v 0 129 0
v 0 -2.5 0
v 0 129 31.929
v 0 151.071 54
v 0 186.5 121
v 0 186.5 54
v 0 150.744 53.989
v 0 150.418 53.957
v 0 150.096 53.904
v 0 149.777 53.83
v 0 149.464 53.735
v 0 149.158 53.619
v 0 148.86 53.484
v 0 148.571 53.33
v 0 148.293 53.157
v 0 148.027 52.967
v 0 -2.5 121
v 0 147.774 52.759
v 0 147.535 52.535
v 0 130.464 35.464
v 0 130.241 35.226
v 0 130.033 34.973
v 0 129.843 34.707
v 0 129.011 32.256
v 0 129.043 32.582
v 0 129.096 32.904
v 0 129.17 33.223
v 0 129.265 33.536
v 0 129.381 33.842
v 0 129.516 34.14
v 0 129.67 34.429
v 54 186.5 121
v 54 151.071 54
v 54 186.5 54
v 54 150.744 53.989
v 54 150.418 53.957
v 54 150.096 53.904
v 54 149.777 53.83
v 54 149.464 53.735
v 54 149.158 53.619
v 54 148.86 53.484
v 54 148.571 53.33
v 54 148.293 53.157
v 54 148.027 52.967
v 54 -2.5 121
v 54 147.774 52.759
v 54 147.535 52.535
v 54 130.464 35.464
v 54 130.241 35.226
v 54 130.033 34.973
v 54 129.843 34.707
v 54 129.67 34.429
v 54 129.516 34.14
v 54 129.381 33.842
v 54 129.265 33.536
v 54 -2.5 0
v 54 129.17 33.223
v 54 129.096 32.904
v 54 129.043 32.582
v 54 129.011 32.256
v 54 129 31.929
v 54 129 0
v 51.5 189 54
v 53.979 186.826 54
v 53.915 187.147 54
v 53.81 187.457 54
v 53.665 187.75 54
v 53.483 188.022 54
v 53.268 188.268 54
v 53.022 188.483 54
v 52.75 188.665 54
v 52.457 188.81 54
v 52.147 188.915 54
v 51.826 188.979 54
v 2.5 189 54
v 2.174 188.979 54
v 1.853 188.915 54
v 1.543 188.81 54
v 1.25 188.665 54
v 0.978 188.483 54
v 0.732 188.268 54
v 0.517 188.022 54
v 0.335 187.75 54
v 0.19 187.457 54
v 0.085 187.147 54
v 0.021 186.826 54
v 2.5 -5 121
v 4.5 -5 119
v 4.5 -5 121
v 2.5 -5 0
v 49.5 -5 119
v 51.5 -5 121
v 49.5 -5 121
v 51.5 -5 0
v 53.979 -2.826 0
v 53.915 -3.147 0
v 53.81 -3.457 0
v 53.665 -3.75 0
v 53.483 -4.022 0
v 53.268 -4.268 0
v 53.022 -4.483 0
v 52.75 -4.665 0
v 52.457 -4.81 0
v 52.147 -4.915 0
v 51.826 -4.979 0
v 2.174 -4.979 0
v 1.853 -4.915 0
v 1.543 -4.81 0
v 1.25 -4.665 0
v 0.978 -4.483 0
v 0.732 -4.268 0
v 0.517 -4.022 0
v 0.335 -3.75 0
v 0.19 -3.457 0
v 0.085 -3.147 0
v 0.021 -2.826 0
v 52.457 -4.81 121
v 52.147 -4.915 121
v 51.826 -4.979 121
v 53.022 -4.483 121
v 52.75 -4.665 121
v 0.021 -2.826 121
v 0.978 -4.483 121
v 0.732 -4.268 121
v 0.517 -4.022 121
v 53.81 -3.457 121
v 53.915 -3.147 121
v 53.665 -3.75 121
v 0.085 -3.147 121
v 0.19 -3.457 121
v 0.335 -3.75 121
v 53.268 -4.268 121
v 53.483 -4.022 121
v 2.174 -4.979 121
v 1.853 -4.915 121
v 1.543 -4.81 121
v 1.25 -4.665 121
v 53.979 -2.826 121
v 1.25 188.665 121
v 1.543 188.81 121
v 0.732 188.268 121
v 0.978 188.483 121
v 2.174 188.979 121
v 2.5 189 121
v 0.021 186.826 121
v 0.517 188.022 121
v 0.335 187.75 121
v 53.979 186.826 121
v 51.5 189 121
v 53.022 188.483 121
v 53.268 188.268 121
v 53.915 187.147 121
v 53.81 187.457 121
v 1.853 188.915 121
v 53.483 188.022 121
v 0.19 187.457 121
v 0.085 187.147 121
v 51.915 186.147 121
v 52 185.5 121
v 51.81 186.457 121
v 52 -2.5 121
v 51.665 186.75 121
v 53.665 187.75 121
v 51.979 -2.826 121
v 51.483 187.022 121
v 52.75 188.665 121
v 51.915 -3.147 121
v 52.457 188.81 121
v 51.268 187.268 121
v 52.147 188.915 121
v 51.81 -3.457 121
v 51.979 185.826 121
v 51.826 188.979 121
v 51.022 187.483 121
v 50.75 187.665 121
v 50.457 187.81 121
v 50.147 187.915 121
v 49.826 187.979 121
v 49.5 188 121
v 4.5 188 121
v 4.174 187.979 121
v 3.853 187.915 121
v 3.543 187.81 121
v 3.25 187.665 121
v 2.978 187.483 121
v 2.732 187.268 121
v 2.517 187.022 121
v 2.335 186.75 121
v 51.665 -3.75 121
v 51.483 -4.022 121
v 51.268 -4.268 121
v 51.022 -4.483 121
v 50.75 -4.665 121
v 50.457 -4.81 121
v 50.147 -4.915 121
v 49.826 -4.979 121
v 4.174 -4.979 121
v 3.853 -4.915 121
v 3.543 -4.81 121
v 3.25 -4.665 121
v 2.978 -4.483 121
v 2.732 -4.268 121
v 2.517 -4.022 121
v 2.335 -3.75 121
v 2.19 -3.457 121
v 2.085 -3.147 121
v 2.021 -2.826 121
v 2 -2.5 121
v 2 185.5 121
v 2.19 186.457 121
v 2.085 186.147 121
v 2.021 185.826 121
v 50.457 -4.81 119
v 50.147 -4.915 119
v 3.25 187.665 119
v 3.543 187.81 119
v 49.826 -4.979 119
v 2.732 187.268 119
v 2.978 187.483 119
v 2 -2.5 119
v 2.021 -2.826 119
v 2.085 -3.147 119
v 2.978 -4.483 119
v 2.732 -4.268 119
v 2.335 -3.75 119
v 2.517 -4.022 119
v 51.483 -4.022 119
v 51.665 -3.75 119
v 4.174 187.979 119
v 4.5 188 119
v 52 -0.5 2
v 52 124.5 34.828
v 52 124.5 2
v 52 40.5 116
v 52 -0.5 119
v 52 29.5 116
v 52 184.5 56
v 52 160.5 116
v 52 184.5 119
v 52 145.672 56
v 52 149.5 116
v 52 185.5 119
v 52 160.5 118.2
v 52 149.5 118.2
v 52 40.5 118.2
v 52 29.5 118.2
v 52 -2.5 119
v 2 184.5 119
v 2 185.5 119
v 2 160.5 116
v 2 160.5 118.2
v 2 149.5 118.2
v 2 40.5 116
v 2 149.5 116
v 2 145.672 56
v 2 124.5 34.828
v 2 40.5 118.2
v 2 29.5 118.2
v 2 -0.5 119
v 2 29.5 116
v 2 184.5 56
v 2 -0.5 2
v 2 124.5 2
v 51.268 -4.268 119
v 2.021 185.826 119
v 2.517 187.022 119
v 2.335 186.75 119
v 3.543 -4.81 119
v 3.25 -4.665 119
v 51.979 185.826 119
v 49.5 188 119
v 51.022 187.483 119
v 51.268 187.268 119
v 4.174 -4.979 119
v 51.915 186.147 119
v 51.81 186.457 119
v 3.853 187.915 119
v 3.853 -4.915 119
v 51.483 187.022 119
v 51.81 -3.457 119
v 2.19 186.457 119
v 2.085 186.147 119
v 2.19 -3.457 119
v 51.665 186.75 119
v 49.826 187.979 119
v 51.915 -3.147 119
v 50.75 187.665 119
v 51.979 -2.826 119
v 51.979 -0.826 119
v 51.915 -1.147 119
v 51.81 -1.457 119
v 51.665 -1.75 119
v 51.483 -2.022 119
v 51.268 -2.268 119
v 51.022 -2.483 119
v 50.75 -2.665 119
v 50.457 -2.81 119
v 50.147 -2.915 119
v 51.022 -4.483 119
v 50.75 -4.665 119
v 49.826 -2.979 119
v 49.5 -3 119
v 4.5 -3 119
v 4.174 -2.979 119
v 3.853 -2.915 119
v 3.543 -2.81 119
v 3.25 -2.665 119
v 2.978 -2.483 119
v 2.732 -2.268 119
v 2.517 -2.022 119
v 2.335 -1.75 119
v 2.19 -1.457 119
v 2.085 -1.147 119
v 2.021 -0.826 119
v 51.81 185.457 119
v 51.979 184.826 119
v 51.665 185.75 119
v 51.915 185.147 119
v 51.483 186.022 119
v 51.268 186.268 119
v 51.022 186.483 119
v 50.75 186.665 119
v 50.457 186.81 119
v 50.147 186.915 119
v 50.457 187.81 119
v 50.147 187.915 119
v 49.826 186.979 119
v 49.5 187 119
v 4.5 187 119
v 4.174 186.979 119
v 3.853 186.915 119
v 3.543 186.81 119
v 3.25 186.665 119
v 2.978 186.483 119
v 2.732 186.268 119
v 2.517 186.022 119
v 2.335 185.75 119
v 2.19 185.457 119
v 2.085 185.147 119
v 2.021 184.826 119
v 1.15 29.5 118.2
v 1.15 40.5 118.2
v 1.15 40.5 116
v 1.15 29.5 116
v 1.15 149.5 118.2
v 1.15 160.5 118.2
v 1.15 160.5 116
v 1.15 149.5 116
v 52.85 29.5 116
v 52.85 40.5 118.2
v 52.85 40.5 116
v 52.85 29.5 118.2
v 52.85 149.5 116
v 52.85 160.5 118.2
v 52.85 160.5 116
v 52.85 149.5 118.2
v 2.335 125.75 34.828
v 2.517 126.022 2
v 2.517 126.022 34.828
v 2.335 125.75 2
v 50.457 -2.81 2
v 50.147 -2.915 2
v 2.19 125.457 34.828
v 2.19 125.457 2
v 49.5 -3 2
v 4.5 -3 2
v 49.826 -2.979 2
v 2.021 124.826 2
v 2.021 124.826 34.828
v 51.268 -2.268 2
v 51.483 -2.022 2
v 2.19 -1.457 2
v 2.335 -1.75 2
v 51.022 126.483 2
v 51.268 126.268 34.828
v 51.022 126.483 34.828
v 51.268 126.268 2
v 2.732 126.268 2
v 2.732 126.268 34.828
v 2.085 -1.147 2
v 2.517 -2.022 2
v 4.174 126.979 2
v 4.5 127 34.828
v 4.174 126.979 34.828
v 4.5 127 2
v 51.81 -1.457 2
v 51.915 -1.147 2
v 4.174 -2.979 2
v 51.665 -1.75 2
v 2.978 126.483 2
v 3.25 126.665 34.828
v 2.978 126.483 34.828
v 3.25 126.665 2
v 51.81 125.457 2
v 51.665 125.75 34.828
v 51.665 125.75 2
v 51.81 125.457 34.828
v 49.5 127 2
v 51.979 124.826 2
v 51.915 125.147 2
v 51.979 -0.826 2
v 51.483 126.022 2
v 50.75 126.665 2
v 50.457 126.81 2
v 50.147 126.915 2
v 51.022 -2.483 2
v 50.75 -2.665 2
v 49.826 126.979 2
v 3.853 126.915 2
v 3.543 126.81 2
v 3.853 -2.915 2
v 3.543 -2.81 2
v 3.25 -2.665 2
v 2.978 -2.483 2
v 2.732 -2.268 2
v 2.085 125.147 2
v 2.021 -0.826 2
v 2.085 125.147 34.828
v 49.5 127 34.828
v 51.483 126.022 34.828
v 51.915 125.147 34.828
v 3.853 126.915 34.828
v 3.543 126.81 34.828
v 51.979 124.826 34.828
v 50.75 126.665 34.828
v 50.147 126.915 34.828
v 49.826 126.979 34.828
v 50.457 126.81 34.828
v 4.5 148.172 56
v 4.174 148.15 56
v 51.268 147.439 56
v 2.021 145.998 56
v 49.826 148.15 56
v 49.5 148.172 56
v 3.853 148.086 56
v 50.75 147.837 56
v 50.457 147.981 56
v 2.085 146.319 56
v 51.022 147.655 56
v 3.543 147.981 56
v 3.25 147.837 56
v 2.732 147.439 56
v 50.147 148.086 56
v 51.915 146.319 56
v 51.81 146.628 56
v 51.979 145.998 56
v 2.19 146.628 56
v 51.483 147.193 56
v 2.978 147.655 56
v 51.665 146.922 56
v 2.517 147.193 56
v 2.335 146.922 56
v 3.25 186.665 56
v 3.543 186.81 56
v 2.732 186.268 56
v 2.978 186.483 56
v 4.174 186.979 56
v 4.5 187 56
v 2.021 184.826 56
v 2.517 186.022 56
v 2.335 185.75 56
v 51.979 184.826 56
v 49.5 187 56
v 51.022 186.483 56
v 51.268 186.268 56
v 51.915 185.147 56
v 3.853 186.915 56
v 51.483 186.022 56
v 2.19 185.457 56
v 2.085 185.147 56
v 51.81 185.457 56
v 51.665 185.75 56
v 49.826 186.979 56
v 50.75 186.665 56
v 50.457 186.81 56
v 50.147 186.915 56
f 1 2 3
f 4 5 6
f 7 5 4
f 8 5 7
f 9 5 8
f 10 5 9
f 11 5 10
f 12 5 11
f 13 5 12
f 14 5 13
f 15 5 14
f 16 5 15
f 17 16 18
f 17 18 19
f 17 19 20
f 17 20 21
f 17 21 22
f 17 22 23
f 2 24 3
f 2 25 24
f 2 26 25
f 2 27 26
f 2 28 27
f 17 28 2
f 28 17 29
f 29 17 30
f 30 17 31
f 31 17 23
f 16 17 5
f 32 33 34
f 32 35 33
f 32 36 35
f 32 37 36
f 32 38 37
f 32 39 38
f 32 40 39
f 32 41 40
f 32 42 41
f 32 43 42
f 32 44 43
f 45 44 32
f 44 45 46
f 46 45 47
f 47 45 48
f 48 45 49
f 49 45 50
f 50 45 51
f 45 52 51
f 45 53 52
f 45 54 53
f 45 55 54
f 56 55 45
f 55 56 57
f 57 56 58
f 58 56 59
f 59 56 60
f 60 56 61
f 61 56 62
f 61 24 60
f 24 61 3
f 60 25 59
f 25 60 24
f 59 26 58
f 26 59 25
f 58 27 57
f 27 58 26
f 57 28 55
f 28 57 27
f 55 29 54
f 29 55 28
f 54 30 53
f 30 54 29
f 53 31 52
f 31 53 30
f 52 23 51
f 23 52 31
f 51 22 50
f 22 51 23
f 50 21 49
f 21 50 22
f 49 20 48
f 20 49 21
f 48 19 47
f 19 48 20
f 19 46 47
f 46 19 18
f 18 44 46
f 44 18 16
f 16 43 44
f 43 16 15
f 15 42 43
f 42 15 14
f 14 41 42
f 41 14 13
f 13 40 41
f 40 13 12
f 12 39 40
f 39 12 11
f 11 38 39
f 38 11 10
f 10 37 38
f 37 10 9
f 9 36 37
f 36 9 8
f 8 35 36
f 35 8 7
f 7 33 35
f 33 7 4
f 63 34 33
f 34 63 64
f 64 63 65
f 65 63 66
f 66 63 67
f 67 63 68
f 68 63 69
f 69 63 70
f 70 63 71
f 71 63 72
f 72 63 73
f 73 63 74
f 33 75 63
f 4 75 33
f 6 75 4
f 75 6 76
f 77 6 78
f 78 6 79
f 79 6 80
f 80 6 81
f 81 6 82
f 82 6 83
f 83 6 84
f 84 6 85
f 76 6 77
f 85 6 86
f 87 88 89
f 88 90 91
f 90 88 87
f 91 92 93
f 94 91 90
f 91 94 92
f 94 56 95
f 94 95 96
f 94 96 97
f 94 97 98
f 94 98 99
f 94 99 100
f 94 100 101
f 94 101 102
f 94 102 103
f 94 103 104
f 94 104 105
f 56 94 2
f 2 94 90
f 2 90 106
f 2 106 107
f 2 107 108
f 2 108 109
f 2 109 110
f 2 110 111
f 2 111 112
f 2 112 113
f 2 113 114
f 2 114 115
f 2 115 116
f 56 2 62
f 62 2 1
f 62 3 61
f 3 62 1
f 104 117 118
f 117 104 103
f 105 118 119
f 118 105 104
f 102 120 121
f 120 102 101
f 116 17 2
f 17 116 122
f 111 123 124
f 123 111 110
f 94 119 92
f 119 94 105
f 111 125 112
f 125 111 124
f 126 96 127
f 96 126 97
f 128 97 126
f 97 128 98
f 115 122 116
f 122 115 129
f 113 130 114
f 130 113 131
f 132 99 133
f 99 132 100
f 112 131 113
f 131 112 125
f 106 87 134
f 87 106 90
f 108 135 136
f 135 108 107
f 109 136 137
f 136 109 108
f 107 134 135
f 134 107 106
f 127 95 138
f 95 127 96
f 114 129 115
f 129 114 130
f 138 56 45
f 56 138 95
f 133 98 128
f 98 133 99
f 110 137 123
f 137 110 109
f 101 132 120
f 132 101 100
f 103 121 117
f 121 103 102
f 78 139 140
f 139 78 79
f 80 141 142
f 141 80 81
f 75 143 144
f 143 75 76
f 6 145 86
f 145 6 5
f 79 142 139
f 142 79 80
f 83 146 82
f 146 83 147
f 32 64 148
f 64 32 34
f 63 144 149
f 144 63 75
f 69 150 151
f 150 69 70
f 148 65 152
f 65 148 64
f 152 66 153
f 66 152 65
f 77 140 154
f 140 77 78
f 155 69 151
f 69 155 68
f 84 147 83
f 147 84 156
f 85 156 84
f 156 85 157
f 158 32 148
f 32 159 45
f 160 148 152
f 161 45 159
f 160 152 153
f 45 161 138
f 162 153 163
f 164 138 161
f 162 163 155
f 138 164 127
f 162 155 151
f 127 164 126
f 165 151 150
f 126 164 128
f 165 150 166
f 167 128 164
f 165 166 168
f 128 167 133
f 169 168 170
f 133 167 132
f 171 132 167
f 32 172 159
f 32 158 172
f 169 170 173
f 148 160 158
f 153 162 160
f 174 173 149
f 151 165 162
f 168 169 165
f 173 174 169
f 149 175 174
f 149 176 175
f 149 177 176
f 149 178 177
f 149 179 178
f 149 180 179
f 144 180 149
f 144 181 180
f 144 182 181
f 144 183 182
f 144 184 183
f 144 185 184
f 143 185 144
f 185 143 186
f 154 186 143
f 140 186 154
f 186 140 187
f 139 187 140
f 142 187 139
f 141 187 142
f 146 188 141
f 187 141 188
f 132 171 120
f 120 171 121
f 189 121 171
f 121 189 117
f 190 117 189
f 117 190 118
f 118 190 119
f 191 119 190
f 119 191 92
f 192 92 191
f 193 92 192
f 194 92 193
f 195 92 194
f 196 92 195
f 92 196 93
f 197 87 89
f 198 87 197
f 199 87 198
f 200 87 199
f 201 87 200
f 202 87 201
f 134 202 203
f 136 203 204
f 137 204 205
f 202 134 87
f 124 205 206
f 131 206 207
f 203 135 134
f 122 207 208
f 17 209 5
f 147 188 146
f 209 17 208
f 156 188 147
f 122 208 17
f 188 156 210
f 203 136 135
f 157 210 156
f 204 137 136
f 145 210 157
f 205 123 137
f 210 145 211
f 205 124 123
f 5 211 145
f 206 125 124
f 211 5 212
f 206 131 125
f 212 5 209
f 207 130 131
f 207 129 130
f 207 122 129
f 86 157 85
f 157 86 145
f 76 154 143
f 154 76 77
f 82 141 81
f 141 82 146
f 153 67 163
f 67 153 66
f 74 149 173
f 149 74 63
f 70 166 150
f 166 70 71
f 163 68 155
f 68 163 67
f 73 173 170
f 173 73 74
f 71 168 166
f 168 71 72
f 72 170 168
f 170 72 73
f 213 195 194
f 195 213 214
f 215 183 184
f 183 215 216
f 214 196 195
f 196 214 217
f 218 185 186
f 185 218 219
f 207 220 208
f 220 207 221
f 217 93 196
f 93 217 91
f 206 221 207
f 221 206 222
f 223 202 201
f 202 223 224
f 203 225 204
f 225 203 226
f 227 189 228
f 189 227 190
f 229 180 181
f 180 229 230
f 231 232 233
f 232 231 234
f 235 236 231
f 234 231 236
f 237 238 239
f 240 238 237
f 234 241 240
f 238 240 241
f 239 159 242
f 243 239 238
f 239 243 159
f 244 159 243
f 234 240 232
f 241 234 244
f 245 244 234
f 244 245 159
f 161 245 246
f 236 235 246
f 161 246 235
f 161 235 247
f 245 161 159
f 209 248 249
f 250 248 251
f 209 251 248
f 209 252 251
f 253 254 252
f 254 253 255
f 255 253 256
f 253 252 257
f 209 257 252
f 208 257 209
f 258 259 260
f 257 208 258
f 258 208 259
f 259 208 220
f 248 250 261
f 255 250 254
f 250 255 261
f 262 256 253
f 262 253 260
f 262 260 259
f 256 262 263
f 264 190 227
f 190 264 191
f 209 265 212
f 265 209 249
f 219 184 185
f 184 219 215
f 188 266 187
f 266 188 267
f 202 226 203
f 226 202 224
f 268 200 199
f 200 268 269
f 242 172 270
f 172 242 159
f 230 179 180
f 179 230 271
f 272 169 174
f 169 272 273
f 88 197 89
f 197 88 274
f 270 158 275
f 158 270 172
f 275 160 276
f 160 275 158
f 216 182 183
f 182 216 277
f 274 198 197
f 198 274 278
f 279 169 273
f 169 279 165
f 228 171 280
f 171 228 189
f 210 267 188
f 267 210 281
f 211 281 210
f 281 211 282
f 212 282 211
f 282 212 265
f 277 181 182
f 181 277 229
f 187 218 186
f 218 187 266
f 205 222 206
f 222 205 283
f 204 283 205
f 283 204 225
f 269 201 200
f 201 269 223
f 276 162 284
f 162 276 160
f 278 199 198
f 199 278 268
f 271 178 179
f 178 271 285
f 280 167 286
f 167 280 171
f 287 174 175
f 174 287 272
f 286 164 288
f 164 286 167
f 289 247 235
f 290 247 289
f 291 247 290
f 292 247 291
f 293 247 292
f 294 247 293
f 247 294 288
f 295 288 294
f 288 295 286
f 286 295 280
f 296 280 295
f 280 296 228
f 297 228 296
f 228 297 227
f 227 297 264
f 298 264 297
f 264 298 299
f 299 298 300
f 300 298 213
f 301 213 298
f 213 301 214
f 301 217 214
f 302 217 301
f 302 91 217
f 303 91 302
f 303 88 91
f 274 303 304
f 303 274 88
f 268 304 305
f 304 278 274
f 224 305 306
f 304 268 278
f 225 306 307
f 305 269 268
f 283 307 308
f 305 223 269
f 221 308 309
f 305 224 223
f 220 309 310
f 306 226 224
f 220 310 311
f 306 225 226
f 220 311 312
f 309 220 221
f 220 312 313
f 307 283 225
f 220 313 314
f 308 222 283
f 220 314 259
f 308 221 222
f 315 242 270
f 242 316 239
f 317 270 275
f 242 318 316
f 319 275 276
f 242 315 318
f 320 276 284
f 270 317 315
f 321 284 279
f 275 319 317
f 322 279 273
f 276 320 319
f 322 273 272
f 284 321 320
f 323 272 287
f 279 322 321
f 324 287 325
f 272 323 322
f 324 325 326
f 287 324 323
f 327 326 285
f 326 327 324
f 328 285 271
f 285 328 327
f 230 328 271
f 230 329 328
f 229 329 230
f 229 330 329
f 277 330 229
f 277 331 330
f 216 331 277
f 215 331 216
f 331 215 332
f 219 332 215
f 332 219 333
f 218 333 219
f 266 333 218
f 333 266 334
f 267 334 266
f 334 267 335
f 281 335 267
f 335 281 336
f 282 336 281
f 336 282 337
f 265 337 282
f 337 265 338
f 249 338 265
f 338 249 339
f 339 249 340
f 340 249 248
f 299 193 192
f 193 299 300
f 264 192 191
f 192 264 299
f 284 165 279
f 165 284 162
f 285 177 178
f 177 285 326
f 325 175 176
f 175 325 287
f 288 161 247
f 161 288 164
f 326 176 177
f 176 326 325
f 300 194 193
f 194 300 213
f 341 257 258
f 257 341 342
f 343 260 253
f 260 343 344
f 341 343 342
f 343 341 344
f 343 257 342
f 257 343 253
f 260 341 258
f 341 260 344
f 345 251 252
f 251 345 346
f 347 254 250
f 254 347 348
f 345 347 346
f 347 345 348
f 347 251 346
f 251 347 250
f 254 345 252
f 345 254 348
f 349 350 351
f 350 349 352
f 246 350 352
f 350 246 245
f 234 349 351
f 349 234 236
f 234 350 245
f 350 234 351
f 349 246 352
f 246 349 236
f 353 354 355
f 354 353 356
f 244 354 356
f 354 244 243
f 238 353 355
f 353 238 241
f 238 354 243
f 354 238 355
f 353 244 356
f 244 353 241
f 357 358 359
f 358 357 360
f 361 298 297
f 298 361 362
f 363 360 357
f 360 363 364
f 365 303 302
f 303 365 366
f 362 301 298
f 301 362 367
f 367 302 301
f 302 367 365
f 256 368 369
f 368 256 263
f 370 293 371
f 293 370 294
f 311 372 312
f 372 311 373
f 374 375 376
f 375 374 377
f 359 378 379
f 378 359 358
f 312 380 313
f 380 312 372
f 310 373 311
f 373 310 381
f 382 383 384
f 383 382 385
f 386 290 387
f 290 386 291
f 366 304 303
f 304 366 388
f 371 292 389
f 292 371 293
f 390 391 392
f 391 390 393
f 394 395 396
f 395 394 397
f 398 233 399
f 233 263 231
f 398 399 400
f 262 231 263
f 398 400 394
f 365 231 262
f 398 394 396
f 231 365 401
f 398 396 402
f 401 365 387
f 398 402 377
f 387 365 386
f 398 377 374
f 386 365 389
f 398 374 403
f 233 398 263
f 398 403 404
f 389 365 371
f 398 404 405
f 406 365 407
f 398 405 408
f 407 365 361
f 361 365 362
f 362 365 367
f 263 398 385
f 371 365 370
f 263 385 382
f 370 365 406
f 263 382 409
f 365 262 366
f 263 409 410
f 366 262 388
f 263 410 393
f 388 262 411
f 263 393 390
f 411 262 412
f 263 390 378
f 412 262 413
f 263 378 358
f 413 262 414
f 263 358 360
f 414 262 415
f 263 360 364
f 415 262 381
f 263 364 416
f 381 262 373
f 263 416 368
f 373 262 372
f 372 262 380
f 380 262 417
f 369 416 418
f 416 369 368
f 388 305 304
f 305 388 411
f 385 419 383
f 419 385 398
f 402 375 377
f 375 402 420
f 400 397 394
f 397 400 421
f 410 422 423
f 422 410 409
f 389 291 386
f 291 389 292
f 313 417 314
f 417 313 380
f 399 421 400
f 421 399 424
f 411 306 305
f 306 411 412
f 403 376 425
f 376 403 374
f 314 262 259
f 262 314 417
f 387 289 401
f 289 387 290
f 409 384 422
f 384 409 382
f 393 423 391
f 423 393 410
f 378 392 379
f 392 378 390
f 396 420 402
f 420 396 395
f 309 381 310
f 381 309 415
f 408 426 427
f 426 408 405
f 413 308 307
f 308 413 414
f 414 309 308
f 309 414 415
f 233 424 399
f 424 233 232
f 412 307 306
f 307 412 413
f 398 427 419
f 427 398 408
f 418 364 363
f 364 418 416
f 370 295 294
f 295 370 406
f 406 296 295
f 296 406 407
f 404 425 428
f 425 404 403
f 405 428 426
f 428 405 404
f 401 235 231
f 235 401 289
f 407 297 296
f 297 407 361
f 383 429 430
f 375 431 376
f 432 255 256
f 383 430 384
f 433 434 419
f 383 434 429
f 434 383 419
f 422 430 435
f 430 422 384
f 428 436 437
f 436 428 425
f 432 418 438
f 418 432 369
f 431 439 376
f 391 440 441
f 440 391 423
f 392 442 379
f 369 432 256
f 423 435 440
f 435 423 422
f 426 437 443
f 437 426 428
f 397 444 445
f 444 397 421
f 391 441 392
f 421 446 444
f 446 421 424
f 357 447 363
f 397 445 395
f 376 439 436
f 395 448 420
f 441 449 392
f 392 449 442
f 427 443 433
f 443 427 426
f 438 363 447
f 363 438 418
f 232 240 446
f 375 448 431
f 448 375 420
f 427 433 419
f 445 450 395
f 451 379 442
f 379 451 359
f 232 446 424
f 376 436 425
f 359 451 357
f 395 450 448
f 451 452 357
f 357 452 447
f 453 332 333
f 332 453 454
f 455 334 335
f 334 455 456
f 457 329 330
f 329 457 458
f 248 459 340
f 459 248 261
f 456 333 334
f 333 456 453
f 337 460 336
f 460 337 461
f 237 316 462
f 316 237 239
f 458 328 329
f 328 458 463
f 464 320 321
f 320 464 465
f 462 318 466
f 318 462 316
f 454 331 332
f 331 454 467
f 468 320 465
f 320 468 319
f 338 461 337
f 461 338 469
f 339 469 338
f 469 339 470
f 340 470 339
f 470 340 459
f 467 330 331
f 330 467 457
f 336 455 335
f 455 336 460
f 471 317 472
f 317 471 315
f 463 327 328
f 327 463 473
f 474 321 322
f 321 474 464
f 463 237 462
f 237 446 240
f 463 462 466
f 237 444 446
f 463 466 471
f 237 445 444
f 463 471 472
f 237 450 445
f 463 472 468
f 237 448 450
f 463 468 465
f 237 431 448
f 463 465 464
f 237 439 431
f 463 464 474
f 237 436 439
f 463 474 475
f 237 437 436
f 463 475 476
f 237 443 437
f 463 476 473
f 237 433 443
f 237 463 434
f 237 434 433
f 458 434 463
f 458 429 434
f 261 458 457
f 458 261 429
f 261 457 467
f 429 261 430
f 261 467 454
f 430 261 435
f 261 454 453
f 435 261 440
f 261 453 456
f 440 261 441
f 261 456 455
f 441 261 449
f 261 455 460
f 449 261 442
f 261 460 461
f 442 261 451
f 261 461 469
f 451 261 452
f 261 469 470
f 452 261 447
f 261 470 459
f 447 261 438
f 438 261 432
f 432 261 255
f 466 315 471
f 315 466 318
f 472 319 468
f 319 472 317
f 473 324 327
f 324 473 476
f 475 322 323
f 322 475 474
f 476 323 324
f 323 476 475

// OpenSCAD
// Parametric reconstruction of 干燥剂盒.stl.
//
// Open in OpenSCAD. Set `show_lid` to true for
// a quick fit preview; export box_lid.scad separately for the lid.

include <common.scad>;

show_lid = false;
lid_preview_file = "box_lid_rebuilt.stl";
show_baffle = false;
baffle_preview_file = "desiccant_baffle_rebuilt.stl";

module desiccant_box() {
    desiccant_box_shell();
}

desiccant_box();

if (show_lid) {
    // Restore the print-oriented lid STL to its assembled position.
    %translate([0, 188, 121])
        rotate([180, 0, 0])
            import(lid_preview_file);
}

if (show_baffle) {
    %translate([0, 0, baffle_middle_z]) import(baffle_preview_file);
}
